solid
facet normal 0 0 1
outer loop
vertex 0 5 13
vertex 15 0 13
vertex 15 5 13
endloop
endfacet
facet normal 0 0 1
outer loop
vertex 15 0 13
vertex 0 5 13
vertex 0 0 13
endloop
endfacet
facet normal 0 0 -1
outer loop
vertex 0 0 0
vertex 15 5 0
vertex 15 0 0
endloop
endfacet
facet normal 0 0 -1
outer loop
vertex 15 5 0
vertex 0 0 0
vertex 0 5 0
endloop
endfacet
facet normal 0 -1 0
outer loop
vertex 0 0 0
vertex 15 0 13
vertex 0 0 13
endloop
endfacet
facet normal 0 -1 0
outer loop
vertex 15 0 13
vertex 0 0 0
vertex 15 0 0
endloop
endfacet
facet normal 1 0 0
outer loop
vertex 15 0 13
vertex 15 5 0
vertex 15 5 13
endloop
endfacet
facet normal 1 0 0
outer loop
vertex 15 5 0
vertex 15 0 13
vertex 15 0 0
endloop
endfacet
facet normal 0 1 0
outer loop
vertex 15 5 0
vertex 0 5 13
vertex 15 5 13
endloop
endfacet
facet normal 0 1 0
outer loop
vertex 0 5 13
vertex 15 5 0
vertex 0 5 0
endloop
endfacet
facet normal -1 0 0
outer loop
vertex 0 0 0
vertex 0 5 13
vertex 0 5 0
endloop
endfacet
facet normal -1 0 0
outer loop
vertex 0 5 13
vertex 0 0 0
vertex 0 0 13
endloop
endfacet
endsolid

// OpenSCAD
// Generated by SolidPython 1.0.1 on 2020-07-29 00:46:55


cube(size = [15, 5, 13]);
/***********************************************
*********      SolidPython code:      **********
************************************************
 
# import packages: SolidPython
from solid import *
from solid.utils import *
from itertools import chain, combinations, permutations


class Resize:

    def __init__(self, scad_file):
        self.scad_file = scad_file
        #self.scad_file = import_scad(scad_file)
        # cone/cylinder param:
        self.r1 = 0
        self.r2 = 0
        self.h = 0
        # rectangular prism param:
        self.w = 0
        self.l = 0
        # ellipse param:
        self.r = 0

    # import OpenScad code (file name corresponds to shape)


    # classify shape + parameters
    def assign(self, param1, param2, param3):
        if self.scad_file == 'cone.scad':
            self.r1 = param1
            self.r2 = param2
            self.h = param3
        elif self.scad_file == 'cylinder.scad':
            self.r1 = param1
            self.r2 = param2
            self.h = param3
        elif self.scad_file == 'rectangularPrism.scad':
            self.h = param1
            self.l = param2
            self.w = param3
        else:
            self.r = param1
            self.h = param2

    # resize parameters
    def iterate(self):
        x = range(3, 20, 2)
        i = 1
        if self.scad_file == 'cone.scad':
            tempList = list(permutations(x, 2))
            for temp in tempList:
                param1 = temp[0]
                param2 = temp[1]
                filepath = 'produced_scad_files/' + 'cone' + str(param1) + '_' + str(param2) + '_' + '.scad'
                scad_render_to_file(cylinder(h=param1, r1=param2, r2=0), filepath)

        elif self.scad_file == 'cylinder.scad':
            tempList = list(permutations(x, 3))
            for temp in tempList:
                param1 = temp[0]
                param2 = temp[1]
                filepath = 'produced_scad_files/' + 'cylinder' + str(param1) + '_' + str(param2) + '_' + '.scad'
                scad_render_to_file(cylinder(h=param1, r1=param2, r2=param2), filepath)

        elif self.scad_file == 'rectangularPrism.scad':
            tempList = list(permutations(x, 3))
            for temp in tempList:
                param1 = temp[0]
                param2 = temp[1]
                param3 = temp[2]
                filepath = 'produced_scad_files/' + 'rectangularPrism' + str(param1) + '_' + str(param2) + '_' + str(
                    param3) + '.scad'
                scad_render_to_file(cube(size=(param1, param2, param3)), filepath)

        elif self.scad_file == 'ellipse.scad':
            tempList = list(permutations(x, 4))
            for temp in tempList:
                param1 = temp[0]
                param2 = temp[1]
                param3 = temp[2]
                param4 = temp[3]
                filepath = 'produced_scad_files/' + 'ellipse' + str(param1) + '_' + str(param2) + '_' + str(param3) + '_' + str(param4) + '.scad'
                scad_render_to_file(scale([param1, param2, param3])(sphere(r=param4)), filepath)

    def render_to_scadfile(self):
        scad_render_to_file(scad, 'example.scad') 
 
************************************************/
